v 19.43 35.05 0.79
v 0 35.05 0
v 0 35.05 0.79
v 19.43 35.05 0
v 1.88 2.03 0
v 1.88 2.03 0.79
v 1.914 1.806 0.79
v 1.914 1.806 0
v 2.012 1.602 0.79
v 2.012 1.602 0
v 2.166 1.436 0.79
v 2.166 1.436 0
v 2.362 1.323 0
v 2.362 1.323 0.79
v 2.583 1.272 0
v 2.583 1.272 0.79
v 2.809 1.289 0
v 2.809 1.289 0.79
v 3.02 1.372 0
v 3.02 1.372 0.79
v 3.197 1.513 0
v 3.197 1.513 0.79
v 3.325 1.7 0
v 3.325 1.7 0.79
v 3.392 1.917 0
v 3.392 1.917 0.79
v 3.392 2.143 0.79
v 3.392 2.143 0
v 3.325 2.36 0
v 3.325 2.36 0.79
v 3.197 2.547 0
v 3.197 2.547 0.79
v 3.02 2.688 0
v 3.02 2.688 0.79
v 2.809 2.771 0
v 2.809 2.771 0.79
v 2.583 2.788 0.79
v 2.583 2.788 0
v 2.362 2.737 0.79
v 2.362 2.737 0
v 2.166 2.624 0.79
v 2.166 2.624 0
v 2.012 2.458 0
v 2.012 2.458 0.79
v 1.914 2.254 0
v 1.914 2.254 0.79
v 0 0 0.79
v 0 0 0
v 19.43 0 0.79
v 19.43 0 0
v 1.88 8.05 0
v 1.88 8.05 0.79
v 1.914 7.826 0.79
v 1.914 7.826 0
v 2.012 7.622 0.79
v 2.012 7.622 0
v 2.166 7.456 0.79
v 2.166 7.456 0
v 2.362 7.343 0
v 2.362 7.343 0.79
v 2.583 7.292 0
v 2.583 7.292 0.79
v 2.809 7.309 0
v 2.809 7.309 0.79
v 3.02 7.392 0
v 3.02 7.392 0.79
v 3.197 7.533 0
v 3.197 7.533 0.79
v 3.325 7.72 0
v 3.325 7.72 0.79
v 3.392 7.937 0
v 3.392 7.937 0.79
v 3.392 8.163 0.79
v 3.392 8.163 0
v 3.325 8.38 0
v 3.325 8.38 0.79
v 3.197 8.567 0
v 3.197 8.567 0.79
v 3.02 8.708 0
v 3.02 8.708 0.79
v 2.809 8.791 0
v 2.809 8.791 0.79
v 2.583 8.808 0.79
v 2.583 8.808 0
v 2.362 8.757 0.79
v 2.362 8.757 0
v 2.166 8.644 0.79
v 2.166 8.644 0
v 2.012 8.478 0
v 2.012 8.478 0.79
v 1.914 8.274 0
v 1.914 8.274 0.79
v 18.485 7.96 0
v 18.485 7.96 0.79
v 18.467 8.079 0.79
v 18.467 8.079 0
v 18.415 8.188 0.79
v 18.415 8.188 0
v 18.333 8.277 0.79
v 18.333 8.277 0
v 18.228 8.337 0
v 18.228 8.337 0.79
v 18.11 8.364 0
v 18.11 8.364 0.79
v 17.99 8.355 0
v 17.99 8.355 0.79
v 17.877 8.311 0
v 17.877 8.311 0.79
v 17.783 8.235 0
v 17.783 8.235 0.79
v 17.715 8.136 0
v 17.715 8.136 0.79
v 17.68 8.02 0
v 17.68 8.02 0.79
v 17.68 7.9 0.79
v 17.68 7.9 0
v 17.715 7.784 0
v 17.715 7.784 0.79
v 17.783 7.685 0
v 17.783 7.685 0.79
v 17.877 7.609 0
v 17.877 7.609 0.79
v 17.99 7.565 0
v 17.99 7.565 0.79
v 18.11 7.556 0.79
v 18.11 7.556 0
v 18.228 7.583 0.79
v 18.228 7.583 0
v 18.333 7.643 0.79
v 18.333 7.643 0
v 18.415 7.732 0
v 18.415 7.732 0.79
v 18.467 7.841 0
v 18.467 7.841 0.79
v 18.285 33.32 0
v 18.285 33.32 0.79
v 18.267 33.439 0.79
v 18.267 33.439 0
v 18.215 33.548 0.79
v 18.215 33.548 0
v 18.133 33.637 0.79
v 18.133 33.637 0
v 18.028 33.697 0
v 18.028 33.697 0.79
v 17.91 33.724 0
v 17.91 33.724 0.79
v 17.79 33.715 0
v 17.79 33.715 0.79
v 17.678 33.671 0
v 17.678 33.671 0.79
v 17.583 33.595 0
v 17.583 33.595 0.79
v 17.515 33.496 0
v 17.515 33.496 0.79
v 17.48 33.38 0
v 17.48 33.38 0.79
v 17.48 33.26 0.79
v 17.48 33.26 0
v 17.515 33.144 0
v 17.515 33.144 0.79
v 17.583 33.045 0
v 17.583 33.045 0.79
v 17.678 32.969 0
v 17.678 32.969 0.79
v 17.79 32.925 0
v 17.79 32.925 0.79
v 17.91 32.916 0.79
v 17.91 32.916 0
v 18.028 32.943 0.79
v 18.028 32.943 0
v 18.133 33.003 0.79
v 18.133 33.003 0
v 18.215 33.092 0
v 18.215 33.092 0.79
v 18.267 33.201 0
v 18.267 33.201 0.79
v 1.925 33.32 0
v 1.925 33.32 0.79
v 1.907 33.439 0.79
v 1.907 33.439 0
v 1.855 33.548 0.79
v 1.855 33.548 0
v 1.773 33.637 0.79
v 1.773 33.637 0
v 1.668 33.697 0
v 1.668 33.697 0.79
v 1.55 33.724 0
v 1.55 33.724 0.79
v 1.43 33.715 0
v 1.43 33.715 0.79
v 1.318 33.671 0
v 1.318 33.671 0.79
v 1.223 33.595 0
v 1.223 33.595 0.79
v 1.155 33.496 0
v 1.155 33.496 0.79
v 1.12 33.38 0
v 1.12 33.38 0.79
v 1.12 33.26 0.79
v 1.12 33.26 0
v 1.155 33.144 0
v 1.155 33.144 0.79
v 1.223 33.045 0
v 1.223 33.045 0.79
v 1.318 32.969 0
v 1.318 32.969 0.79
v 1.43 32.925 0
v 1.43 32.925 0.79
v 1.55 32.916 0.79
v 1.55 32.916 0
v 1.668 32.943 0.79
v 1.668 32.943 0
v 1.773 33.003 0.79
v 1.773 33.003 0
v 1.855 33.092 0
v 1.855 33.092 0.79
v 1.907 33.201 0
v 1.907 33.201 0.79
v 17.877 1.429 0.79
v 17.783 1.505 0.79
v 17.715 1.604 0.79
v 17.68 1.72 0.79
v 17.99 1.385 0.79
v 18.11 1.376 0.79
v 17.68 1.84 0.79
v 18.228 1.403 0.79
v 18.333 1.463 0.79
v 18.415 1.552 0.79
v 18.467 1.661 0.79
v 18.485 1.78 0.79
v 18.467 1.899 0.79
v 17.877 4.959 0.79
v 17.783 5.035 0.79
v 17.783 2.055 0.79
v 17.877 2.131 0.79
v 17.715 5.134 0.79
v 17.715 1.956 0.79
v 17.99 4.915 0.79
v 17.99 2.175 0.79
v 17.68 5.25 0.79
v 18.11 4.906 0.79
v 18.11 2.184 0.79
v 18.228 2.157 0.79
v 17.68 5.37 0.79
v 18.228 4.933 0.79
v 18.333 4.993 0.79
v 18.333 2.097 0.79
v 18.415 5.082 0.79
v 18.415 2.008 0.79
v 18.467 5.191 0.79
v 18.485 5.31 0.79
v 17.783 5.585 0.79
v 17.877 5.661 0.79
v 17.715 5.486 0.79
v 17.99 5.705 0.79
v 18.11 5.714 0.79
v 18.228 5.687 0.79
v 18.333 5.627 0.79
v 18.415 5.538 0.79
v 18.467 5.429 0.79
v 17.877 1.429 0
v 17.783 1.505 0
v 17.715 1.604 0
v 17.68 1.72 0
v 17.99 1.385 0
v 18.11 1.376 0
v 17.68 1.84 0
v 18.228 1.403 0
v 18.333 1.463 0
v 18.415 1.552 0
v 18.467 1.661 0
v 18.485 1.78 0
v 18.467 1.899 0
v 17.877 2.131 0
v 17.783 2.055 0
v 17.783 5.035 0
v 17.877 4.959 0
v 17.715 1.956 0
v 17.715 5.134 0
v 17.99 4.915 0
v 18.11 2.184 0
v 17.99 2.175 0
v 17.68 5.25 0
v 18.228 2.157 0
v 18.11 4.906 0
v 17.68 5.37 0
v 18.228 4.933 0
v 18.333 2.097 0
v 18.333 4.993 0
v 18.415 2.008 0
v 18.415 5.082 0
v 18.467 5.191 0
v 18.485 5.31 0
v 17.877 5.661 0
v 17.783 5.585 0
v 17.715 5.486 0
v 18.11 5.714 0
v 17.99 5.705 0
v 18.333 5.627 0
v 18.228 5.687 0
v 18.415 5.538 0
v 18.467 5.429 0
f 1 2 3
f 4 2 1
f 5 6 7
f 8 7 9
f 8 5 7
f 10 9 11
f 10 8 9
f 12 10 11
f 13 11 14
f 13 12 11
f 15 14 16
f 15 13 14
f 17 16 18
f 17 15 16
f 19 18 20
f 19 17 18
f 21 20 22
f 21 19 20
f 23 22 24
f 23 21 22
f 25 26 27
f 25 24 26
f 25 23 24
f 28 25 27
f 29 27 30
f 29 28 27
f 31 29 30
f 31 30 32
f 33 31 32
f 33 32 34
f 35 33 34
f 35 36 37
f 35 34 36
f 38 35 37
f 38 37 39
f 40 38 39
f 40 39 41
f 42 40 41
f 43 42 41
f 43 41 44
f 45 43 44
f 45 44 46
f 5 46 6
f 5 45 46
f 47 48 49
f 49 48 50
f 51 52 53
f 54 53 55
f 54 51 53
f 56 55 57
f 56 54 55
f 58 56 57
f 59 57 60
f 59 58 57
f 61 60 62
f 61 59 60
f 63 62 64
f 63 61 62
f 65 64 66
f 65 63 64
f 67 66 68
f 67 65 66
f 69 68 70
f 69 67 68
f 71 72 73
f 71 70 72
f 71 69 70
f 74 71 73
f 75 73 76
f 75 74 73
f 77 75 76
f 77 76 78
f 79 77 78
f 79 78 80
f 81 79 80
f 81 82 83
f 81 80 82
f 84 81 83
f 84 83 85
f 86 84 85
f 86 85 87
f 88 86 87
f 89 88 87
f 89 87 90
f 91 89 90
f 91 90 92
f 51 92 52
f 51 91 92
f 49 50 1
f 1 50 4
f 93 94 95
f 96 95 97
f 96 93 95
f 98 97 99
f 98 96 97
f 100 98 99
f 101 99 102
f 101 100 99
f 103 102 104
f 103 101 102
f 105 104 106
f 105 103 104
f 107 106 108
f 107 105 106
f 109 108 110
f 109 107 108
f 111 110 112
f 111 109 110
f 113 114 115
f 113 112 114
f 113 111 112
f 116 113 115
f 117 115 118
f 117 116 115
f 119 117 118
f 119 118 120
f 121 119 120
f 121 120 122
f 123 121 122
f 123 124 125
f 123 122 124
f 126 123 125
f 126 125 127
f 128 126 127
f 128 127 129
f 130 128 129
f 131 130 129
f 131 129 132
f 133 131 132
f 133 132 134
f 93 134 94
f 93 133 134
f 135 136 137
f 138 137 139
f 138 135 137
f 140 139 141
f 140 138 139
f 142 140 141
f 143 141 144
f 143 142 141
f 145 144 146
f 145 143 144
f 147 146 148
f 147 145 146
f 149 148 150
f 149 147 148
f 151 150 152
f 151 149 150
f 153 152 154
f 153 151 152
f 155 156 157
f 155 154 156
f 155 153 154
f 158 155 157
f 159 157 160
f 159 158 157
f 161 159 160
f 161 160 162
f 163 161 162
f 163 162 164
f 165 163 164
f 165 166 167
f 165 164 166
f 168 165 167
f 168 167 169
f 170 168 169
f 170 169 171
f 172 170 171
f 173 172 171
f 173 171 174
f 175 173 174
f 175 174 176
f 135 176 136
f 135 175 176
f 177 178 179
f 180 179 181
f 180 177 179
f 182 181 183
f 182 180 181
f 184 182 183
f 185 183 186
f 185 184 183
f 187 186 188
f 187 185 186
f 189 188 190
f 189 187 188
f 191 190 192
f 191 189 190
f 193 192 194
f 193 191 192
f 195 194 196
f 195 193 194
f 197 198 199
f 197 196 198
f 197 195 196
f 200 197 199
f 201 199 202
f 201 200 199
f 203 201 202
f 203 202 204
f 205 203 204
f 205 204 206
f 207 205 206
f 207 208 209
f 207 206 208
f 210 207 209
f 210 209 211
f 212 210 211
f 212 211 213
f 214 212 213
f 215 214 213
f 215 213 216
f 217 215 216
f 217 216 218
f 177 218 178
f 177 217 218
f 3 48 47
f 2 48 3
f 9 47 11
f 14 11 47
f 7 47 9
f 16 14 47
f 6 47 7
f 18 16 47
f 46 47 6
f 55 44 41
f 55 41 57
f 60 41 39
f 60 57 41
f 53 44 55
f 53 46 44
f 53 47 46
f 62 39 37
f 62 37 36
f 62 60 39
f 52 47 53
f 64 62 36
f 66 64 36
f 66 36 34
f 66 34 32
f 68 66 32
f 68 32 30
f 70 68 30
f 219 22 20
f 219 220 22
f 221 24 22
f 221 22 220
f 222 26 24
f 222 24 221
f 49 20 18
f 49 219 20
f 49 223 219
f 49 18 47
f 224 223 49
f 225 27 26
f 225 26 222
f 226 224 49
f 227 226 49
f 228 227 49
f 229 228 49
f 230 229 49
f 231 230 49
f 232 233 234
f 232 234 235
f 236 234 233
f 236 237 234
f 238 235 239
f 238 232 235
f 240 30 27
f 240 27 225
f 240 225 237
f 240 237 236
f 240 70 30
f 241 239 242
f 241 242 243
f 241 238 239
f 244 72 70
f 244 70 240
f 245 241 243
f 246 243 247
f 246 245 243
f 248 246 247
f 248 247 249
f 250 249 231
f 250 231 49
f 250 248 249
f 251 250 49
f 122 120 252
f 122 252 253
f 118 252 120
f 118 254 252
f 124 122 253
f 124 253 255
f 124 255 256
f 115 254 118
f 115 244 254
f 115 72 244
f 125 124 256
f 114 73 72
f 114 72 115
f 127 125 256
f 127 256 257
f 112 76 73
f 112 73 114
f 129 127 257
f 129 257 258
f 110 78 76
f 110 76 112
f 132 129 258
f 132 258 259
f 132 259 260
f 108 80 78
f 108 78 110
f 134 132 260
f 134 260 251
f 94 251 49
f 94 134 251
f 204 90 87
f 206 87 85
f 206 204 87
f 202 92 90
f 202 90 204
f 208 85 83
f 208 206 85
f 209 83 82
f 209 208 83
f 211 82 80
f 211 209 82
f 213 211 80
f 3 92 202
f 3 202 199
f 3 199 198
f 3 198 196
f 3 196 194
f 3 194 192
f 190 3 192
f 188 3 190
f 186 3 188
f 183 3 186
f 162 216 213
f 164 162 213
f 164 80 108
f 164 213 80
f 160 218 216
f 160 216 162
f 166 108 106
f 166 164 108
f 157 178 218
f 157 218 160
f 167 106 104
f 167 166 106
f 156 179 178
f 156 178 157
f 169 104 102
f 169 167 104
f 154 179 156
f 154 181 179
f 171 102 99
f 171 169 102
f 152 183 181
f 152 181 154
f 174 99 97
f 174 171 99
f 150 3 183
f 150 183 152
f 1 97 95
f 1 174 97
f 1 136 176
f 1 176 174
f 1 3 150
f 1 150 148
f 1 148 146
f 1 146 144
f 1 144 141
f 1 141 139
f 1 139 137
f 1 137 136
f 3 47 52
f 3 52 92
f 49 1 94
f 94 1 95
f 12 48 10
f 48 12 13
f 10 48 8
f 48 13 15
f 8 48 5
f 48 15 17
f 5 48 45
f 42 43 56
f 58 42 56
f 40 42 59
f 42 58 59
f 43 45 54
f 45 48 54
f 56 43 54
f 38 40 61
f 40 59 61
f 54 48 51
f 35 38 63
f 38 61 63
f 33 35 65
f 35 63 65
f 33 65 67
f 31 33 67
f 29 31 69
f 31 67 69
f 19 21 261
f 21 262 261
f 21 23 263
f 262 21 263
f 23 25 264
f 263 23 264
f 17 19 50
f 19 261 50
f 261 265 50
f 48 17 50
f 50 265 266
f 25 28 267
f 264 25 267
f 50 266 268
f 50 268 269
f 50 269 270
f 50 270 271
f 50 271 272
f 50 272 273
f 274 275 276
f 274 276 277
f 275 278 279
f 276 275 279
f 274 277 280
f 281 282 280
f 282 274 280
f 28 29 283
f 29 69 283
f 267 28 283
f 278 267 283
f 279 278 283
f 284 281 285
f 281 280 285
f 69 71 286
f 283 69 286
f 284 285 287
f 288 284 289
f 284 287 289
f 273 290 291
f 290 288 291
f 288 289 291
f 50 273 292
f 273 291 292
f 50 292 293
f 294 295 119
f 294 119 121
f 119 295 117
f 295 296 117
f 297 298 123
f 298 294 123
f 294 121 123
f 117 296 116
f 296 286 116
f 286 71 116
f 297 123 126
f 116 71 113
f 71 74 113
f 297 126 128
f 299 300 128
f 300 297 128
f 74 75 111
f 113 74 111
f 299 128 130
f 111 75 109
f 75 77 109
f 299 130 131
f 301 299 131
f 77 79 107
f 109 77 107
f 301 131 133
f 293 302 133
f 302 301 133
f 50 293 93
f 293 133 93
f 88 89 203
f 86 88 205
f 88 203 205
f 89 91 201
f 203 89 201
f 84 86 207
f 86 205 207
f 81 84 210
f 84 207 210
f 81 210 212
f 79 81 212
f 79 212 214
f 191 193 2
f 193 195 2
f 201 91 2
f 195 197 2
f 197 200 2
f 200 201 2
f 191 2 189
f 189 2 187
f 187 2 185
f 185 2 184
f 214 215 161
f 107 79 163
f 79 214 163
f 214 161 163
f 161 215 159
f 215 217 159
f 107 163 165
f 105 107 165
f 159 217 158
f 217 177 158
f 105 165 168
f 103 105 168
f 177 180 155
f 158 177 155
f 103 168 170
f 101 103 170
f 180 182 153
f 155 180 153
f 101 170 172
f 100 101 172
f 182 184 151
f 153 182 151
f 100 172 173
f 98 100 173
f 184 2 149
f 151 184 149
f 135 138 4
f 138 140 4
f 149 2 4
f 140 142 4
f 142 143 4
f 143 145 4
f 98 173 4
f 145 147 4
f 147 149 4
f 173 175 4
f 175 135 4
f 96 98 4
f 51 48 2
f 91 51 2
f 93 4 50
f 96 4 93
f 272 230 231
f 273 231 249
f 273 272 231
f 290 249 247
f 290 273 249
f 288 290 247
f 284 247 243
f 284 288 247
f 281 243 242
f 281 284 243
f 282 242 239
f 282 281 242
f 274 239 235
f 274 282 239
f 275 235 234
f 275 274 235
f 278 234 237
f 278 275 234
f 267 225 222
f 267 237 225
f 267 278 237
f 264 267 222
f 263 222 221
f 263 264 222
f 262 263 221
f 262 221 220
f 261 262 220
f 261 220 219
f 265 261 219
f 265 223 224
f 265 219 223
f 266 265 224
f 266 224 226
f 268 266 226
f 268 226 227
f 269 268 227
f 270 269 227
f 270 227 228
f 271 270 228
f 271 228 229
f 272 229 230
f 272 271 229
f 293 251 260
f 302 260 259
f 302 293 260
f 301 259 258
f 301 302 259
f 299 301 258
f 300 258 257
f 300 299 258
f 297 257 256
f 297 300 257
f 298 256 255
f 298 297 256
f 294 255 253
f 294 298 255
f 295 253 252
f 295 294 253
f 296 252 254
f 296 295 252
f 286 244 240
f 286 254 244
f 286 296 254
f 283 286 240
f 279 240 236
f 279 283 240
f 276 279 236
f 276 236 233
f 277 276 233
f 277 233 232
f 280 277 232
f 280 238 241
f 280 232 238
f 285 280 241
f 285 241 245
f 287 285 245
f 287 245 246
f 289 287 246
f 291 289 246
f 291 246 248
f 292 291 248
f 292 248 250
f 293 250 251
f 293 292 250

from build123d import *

# Parameters (mm, degrees)
SKETCH1_W           = 19.43
SKETCH1_H           = 35.05
BOARD_OUTLINE_DEPTH = 0.79
SKETCH2_R           = 0.405
SKETCH2_R_2         = 0.76
PTH_DEPTH           = 41.083057518


with BuildPart() as part:
    # Sketch1 → Board_Outline (new body)
    with BuildSketch(Plane.XY):
        with Locations((9.715, 17.525)):
            Rectangle(SKETCH1_W, SKETCH1_H)
    extrude(amount=BOARD_OUTLINE_DEPTH)

    # Sketch2 → PTH (cut, through all)
    with BuildSketch(Plane.XY):
        with Locations((18.08, 5.31)):
            Circle(SKETCH2_R)
        with Locations((17.88, 33.32)):
            Circle(SKETCH2_R)
        with Locations(Location((2.64, 8.05, 0), (0, 0, 180))):
            Circle(SKETCH2_R_2)
        with Locations(Location((2.64, 2.03, 0), (0, 0, 180))):
            Circle(SKETCH2_R_2)
        with Locations((18.08, 7.96)):
            Circle(SKETCH2_R)
        with Locations((1.52, 33.32)):
            Circle(SKETCH2_R)
        with Locations((18.08, 1.78)):
            Circle(SKETCH2_R)
    extrude(amount=PTH_DEPTH, mode=Mode.SUBTRACT)


solid = part.part
